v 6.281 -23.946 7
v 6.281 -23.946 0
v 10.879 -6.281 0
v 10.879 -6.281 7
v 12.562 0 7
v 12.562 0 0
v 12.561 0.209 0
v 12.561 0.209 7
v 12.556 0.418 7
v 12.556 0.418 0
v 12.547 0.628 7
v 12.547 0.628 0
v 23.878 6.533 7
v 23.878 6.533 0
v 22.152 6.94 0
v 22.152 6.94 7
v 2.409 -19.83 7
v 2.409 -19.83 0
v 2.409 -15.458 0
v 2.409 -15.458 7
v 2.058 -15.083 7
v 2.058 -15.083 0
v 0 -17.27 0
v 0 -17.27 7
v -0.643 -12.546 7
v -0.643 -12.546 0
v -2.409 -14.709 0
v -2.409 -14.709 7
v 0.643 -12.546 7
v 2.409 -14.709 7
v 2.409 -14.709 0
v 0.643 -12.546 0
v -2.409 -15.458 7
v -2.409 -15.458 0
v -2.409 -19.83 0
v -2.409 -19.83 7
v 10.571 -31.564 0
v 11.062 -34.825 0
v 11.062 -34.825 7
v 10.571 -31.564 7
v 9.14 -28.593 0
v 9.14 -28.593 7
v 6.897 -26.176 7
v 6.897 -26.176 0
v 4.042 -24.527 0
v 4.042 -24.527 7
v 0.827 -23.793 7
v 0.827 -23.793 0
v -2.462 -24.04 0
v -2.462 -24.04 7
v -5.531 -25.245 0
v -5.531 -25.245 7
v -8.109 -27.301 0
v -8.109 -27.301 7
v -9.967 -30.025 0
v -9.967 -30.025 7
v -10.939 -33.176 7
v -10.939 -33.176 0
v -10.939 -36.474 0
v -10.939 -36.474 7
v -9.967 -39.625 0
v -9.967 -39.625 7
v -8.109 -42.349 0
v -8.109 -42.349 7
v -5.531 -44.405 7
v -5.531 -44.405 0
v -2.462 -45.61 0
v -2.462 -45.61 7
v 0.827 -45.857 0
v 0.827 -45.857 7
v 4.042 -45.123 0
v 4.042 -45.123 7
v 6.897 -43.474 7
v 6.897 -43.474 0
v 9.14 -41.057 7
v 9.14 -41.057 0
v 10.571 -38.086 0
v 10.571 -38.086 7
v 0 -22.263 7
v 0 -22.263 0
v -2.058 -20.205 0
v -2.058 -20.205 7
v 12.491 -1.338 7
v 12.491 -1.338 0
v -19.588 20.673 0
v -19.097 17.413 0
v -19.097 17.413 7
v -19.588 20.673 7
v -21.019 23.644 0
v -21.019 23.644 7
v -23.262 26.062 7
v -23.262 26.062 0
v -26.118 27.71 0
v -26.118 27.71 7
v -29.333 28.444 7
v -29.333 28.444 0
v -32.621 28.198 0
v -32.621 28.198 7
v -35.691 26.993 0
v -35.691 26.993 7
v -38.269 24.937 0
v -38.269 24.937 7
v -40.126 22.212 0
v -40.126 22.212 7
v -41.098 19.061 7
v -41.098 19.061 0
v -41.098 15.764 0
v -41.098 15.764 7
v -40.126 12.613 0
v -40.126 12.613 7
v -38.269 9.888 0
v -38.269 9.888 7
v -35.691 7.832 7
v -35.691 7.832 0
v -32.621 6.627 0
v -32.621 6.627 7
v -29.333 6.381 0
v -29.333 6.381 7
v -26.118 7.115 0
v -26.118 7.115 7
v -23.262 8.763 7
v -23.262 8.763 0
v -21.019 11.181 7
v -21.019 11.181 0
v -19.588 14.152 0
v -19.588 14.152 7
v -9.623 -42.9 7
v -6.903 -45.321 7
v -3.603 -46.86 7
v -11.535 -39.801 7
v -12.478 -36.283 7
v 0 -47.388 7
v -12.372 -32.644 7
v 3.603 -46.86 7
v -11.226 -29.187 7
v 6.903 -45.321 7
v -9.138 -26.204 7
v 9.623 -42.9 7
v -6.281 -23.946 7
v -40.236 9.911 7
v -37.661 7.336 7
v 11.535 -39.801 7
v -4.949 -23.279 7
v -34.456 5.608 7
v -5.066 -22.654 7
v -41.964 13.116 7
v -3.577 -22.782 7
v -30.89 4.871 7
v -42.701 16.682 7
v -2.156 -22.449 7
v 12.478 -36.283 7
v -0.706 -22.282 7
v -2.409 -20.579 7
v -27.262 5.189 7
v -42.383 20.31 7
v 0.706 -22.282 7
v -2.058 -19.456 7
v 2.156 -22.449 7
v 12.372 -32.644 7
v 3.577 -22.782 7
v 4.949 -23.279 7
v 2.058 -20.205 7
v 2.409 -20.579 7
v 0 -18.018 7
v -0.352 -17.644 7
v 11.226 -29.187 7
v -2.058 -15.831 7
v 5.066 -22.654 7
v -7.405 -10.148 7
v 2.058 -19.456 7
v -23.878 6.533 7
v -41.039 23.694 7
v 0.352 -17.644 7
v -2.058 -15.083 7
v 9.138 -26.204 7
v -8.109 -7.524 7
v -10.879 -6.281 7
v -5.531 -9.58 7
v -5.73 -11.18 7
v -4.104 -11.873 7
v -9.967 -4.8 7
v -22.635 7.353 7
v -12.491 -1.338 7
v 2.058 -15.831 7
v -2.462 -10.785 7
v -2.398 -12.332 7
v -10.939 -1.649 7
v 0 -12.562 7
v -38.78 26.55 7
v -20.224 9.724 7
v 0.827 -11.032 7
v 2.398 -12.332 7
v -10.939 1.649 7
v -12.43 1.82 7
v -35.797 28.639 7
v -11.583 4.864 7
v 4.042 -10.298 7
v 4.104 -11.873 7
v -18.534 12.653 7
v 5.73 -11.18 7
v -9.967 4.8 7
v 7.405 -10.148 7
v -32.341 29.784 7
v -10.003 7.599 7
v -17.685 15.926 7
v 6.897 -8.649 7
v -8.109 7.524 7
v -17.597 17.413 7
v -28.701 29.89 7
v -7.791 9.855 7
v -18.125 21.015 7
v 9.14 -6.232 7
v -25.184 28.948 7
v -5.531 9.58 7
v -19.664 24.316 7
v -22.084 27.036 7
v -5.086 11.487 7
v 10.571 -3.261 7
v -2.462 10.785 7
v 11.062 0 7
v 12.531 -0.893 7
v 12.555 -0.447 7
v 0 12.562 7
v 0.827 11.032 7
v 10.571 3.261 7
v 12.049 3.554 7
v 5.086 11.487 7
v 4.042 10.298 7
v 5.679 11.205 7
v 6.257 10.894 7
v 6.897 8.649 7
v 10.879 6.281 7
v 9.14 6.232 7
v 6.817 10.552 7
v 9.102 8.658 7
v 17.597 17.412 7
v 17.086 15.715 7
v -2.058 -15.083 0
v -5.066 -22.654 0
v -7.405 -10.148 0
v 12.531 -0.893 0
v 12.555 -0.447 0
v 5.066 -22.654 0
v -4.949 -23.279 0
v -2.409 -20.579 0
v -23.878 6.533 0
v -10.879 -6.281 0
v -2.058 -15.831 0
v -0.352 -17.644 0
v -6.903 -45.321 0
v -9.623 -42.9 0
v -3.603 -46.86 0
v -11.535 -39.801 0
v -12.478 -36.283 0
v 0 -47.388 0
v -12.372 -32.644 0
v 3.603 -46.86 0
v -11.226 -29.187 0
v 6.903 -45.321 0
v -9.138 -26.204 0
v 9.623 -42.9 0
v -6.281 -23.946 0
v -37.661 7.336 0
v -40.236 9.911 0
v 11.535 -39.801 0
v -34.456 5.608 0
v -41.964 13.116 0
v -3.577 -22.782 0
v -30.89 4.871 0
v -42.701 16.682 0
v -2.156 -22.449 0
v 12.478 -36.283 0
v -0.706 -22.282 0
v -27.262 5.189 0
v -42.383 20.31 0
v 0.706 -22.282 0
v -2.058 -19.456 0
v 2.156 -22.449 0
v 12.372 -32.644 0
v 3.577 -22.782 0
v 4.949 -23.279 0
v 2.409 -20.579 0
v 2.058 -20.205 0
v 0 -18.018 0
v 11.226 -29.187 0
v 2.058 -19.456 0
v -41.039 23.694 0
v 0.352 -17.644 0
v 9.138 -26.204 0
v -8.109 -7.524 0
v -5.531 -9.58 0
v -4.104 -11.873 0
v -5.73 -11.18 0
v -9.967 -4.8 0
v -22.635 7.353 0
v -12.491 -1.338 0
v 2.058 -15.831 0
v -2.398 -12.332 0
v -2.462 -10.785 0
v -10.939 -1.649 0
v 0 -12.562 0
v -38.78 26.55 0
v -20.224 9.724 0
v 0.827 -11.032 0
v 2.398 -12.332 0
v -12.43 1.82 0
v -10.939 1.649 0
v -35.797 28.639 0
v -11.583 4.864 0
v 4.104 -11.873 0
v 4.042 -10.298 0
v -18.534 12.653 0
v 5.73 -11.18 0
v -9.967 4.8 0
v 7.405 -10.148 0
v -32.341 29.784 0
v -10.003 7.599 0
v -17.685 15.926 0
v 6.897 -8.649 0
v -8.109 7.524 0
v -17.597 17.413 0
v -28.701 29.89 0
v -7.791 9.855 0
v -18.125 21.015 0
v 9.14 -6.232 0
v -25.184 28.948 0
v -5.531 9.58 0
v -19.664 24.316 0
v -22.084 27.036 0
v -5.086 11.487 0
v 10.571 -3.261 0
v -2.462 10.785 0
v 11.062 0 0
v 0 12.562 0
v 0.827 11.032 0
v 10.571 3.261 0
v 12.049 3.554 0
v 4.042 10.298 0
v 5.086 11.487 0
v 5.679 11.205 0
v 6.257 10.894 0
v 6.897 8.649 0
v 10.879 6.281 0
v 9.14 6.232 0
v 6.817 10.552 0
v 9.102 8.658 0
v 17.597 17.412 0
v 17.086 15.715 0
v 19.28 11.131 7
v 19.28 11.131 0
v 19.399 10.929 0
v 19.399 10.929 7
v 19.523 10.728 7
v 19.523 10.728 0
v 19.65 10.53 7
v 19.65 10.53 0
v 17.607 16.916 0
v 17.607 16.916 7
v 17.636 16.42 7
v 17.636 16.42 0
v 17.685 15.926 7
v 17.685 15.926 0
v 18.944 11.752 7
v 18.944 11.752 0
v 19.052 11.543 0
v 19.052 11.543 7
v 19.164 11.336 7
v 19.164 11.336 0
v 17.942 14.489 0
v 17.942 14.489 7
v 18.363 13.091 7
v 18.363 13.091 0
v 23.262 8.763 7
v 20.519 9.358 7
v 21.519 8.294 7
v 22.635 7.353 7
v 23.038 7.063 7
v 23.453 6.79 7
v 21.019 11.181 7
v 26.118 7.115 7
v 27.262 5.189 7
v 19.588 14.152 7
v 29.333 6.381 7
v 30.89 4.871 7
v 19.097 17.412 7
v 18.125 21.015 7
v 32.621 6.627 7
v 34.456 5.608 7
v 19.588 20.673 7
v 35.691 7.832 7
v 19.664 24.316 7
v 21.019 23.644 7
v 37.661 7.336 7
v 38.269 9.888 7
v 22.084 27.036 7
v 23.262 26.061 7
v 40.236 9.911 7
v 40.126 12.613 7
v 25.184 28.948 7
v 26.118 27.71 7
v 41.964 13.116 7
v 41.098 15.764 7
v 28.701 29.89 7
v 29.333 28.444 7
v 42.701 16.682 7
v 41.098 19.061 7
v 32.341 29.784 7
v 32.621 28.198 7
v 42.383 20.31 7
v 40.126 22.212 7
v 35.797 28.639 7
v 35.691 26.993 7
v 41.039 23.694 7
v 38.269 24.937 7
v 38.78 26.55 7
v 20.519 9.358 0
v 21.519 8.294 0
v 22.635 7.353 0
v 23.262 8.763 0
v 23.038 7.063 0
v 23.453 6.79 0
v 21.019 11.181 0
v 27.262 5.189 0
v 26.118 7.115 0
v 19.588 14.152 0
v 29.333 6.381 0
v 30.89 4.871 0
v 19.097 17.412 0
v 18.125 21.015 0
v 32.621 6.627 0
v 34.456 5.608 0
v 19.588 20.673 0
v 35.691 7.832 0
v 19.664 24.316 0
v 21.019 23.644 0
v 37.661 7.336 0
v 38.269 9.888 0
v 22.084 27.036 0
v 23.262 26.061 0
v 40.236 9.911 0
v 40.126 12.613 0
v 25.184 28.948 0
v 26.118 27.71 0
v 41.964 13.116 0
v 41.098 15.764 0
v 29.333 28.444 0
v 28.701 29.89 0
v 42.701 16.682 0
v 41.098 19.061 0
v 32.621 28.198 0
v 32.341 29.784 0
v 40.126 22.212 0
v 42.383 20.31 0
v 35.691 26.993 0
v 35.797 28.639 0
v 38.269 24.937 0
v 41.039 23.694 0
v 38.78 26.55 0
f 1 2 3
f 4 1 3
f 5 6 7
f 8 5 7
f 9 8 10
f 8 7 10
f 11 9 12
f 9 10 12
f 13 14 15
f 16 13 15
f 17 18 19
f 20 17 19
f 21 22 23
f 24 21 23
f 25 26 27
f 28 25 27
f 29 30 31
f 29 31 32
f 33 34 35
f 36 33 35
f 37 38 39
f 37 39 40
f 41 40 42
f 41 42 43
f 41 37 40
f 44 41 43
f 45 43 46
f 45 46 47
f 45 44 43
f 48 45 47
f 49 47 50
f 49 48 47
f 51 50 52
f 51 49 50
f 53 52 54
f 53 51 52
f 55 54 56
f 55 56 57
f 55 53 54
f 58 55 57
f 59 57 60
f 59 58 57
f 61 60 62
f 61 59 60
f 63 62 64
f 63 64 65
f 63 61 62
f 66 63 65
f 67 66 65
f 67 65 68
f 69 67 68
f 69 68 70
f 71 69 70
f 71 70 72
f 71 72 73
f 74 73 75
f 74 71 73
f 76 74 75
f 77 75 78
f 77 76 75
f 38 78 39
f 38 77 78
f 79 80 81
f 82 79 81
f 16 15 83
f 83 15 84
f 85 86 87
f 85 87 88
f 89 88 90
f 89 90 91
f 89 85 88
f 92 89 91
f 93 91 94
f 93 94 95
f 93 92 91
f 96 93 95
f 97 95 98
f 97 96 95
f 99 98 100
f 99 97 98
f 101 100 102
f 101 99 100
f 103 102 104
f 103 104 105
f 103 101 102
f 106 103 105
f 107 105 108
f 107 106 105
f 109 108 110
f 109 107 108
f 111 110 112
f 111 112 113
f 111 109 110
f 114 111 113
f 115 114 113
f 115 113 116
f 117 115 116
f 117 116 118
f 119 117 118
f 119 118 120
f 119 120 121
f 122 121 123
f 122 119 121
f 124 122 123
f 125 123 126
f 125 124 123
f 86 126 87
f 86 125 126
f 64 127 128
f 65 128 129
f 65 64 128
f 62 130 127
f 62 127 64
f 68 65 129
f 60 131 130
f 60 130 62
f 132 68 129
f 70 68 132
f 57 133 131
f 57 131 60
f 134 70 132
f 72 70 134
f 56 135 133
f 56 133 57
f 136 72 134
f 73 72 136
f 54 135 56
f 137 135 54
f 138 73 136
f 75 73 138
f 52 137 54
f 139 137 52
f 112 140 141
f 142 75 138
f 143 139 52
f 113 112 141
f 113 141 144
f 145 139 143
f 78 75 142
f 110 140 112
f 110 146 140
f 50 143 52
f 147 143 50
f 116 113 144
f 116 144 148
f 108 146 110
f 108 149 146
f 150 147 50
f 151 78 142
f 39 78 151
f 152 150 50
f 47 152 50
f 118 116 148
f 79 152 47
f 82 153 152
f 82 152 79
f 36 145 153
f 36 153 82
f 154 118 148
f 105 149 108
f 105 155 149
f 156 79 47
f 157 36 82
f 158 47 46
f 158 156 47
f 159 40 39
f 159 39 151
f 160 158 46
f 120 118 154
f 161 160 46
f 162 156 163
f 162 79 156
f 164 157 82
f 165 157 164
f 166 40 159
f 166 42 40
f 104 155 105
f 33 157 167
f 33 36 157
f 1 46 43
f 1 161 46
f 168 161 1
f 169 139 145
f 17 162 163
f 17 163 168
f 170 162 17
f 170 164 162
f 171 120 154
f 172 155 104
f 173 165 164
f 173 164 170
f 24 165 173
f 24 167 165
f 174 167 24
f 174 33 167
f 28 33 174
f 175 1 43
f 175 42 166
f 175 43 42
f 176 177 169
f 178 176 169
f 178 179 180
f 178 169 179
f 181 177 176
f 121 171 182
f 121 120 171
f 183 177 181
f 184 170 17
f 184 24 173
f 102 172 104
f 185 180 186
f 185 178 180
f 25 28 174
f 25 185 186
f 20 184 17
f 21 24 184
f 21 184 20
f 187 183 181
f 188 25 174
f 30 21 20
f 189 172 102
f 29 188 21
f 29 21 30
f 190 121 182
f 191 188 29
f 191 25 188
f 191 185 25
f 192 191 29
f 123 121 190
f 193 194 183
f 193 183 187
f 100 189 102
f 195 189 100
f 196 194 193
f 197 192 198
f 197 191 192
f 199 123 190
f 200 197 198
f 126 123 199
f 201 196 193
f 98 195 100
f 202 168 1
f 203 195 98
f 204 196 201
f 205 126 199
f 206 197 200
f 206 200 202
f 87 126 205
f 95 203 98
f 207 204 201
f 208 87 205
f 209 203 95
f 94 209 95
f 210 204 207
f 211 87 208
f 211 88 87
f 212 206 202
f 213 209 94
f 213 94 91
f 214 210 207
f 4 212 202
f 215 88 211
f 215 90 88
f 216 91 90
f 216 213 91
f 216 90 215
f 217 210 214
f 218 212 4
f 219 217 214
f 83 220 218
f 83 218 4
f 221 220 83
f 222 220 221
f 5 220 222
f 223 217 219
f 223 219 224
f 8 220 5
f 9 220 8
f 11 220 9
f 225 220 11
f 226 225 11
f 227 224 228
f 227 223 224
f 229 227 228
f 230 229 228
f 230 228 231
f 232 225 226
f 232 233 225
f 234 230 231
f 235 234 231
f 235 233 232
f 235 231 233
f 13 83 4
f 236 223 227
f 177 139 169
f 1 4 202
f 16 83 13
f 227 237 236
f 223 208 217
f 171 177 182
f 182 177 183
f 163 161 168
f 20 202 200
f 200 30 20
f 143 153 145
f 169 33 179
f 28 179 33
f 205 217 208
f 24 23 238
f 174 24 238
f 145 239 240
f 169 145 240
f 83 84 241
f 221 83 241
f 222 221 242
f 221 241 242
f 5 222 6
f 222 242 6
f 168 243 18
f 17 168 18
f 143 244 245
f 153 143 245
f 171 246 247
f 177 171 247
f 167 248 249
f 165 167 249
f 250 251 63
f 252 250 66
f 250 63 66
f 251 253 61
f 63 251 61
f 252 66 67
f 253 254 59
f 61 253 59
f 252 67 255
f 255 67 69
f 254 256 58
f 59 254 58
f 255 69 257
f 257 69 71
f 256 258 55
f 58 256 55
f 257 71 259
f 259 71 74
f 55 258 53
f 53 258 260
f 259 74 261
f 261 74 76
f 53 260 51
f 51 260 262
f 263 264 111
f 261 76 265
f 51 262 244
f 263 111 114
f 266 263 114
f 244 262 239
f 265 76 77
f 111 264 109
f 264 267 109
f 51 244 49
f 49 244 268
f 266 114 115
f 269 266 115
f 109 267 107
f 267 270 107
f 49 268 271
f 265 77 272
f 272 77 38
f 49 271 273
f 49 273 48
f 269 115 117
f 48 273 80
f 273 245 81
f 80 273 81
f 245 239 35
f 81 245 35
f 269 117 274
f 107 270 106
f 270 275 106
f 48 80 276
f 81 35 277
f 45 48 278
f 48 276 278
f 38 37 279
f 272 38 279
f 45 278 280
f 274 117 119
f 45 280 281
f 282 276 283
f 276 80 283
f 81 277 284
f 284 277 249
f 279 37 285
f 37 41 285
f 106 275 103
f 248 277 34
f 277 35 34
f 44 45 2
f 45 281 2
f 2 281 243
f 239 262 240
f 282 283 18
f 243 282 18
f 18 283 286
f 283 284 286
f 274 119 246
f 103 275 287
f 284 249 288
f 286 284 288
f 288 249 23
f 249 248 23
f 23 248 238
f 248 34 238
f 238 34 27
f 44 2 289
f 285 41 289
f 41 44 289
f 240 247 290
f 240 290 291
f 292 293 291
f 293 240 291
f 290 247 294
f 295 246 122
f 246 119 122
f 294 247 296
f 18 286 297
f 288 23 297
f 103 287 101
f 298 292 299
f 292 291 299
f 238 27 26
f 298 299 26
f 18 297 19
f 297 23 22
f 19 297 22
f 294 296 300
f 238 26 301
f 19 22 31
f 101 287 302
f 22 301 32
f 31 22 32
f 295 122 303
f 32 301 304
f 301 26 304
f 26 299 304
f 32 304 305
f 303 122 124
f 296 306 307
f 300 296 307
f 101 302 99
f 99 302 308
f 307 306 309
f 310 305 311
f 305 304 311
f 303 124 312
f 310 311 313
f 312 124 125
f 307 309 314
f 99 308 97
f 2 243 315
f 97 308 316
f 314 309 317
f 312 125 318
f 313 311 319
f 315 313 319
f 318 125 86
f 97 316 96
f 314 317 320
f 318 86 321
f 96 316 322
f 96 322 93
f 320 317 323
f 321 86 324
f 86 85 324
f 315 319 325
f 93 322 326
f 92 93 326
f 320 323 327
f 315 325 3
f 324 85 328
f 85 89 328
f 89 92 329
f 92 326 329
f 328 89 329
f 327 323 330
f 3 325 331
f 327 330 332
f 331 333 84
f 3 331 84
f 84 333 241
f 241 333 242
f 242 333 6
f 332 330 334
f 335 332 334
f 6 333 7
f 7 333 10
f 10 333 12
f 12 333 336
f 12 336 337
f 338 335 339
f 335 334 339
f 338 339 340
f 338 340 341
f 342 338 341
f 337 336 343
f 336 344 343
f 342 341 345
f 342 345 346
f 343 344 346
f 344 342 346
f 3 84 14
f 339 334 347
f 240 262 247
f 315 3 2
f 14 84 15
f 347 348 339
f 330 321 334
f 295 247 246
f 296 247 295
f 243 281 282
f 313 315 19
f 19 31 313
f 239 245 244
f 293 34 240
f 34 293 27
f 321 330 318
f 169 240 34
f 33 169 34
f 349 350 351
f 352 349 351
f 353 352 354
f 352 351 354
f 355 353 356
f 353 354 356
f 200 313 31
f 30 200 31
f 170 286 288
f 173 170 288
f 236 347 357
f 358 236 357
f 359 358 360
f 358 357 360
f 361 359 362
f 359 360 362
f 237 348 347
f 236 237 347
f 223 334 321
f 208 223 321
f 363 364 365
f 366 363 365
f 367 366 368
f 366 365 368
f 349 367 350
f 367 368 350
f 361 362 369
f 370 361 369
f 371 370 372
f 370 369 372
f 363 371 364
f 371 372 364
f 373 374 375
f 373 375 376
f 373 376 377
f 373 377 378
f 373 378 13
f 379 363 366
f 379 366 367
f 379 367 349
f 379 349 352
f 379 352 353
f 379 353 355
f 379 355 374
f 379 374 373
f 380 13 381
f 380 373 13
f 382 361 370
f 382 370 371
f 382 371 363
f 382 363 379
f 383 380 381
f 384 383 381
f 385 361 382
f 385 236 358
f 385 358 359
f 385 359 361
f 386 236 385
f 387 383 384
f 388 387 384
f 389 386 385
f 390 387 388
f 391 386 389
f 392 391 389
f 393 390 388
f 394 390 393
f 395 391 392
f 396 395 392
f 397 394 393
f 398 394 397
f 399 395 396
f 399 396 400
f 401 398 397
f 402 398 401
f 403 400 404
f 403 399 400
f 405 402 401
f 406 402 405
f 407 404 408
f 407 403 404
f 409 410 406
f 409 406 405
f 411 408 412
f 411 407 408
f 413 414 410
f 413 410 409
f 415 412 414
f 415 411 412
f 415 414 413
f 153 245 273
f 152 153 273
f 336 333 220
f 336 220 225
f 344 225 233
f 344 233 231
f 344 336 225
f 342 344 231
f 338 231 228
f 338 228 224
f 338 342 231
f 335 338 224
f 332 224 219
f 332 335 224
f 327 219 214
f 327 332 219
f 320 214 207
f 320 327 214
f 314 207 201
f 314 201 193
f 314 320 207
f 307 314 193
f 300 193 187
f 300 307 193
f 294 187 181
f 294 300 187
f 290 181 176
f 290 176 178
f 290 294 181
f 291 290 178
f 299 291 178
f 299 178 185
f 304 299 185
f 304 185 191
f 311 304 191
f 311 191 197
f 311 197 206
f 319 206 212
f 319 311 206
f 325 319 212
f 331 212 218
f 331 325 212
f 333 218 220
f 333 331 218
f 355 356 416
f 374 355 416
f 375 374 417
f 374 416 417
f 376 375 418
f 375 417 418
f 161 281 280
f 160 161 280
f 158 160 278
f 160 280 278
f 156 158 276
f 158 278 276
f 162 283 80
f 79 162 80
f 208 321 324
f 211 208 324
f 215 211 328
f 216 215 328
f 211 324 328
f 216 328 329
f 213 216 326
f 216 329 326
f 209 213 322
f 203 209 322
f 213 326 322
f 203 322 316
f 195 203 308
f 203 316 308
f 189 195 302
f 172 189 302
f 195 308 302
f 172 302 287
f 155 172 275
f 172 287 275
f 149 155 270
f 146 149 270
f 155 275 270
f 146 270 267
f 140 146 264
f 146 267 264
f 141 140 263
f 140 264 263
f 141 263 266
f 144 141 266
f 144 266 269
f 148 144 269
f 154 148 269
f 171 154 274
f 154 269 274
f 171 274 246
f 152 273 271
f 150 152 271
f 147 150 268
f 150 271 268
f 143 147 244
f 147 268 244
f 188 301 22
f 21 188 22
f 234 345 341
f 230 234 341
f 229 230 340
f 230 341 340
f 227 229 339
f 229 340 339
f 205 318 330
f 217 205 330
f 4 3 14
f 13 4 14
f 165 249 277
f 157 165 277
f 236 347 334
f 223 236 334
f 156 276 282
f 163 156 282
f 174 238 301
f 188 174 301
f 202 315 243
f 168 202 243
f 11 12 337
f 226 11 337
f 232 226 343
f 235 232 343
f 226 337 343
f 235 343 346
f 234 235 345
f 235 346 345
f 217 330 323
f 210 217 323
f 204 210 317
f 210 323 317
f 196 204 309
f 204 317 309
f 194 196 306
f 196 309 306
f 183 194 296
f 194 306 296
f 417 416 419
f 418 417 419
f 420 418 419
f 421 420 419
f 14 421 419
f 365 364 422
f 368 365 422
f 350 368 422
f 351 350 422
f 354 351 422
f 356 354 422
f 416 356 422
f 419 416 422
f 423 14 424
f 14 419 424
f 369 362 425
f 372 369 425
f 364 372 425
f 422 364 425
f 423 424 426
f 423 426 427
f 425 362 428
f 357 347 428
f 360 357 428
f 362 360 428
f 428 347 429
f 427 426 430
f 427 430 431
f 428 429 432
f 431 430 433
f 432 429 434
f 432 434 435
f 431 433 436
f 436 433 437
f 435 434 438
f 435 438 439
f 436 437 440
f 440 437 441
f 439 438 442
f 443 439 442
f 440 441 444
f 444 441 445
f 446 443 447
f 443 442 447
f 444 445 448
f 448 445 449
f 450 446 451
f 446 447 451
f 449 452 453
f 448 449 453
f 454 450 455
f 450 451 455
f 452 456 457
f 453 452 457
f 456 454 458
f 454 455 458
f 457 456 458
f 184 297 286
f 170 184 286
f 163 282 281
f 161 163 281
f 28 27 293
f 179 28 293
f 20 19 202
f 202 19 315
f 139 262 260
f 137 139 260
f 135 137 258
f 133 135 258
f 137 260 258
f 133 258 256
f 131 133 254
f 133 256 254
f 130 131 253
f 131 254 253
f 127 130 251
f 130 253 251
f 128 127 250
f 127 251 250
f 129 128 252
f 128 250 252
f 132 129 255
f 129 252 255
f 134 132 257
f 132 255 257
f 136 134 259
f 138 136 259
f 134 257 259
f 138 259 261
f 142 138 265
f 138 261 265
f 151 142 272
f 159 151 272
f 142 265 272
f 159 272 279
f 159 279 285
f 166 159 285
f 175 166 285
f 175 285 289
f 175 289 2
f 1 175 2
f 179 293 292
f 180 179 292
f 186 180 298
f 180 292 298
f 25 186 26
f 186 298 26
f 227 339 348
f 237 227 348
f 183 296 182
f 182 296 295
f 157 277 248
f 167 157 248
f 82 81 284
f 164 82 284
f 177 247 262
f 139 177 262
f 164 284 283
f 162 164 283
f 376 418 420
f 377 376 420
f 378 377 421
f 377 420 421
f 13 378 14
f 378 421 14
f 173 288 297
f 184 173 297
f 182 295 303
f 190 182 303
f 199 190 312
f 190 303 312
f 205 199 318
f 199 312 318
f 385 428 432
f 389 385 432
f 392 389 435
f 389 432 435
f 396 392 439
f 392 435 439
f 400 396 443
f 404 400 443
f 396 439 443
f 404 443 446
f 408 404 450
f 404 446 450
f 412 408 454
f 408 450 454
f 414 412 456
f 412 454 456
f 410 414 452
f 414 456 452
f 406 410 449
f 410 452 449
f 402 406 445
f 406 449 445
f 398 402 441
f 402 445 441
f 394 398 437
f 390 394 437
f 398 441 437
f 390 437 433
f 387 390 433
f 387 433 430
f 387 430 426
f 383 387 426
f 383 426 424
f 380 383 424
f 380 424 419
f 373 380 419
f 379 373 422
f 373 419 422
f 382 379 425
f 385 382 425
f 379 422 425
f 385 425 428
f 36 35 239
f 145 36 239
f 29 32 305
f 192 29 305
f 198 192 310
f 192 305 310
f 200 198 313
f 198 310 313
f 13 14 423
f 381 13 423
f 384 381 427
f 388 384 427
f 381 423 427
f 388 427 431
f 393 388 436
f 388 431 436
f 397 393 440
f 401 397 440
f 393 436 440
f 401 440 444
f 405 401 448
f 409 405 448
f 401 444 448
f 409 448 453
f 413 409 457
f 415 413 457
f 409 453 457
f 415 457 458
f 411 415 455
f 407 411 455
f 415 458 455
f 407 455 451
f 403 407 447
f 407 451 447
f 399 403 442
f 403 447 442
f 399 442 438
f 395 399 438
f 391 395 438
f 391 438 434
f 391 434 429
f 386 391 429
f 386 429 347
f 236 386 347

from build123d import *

# Parameters (mm, degrees)
F0_R     = 11.0625
F1_DEPTH = 7
F2_DEPTH = 7
F3_DEPTH = 7


# Not quite as in the source:
# - ends of sketch curves that miss each other by under 0.0002 mm in the source are joined


with BuildPart() as f1:
    # F0 (on Top) → F1 (new body)
    with BuildSketch(Plane.XY):
        with BuildLine():
            ThreePointArc((-22.6345681923, 7.3529683934), (-23.2441620991, 6.9245708082), (-23.878080543, 6.5330652161))
            Line((-23.878080543, 6.5330652161), (-10.879445222, -6.2812481173))
            ThreePointArc((-10.879445222, -6.2812481173), (-11.9437306049, -3.894060283), (-12.4910099647, -1.3383109926))
            Line((-12.4910099647, -1.3383109926), (-22.6345681923, 7.3529683934))
        make_face()
        with BuildLine():
            ThreePointArc((-17.6851304944, 15.925639103), (-17.6189235491, 16.6677649143), (-17.5968286604, 17.4125104381))
            ThreePointArc((-17.5968286604, 17.4125104381), (-41.0387722519, 23.6937613794), (-23.878080543, 6.5330652161))
            ThreePointArc((-23.878080543, 6.5330652161), (-23.2441620991, 6.9245708082), (-22.6345681923, 7.3529683934))
            ThreePointArc((-22.6345681923, 7.3529683934), (-19.2798866993, 11.1312566727), (-17.6851304944, 15.925639103))
        make_face()
        with Locations((-30.1593286604, 17.4125104381)):
            Circle(F0_R, mode=Mode.SUBTRACT)
        with BuildLine():
            Line((6.5218e-06, 12.5625), (-17.5968286604, 17.4125039163))
            ThreePointArc((-17.5968286604, 17.4125039163), (-17.6189235491, 16.6677649143), (-17.6851304944, 15.925639103))
            Line((-17.6851304944, 15.925639103), (-5.0864857136, 11.4866909655))
            ThreePointArc((-5.0864857136, 11.4866909655), (-2.5995016661, 12.2906060607), (6.5218e-06, 12.5625))
        make_face()
        with BuildLine():
            ThreePointArc((5.0864976401, 11.4866856842), (2.5995144273, 12.2906033616), (6.5218e-06, 12.5625))
            ThreePointArc((6.5218e-06, 12.5625), (-2.5995016661, 12.2906060607), (-5.0864857136, 11.4866909655))
            ThreePointArc((-5.0864857136, 11.4866909655), (-10.8794419611, 6.2812537653), (-12.4910099647, -1.3383109926))
            ThreePointArc((-12.4910099647, -1.3383109926), (-11.9437306049, -3.894060283), (-10.879445222, -6.2812481173))
            ThreePointArc((-10.879445222, -6.2812481173), (-9.3442233374, -8.3965407443), (-7.4045198124, -10.1483738893))
            ThreePointArc((-7.4045198124, -10.1483738893), (-6.5874472871, -10.6968193632), (-5.729952579, -11.1796265453))
            ThreePointArc((-5.729952579, -11.1796265453), (-3.2590434265, -12.1323963912), (-0.6433064868, -12.546017815))
            ThreePointArc((-0.6433064868, -12.546017815), (-0.3217587988, -12.5583787777), (0, -12.5625))
            ThreePointArc((0, -12.5625), (0.3217590306, -12.5583787718), (0.64330695, -12.5460177912))
            ThreePointArc((0.64330695, -12.5460177912), (3.2590426993, -12.1323965866), (5.7299508261, -11.1796274437))
            ThreePointArc((5.7299508261, -11.1796274437), (6.5874457148, -10.6968203315), (7.4045184202, -10.1483749051))
            ThreePointArc((7.4045184202, -10.1483749051), (9.3442190031, -8.3965455678), (10.879439599, -6.2812578567))
            ThreePointArc((10.879439599, -6.2812578567), (11.9437270351, -3.894071232), (12.491008709, -1.3383227122))
            ThreePointArc((12.491008709, -1.3383227122), (12.5446144452, -0.6701154167), (12.5625, 0))
            ThreePointArc((12.5625, 0), (12.5585786957, 0.3138588742), (12.546817231, 0.6275218102))
            ThreePointArc((12.546817231, 0.6275218102), (10.8794485026, 6.2812424352), (6.816873119, 10.5520920736))
            ThreePointArc((6.816873119, 10.5520920736), (5.9700021073, 11.0533018184), (5.0864976401, 11.4866856842))
        make_face()
        Circle(F0_R, mode=Mode.SUBTRACT)
        with BuildLine():
            Line((17.5968467396, 17.4124856456), (6.5218e-06, 12.5625))
            ThreePointArc((6.5218e-06, 12.5625), (2.5995144273, 12.2906033616), (5.0864976401, 11.4866856842))
            Line((5.0864976401, 11.4866856842), (17.0859847543, 15.7145153795))
            Line((17.0859847543, 15.7145153795), (17.5968467396, 17.4124856456))
        make_face()
        with BuildLine():
            Line((10.879439599, -6.2812578567), (23.8780929743, 6.5330371628))
            Line((23.8780929743, 6.5330371628), (22.1521745654, 6.9396060316))
            Line((22.1521745654, 6.9396060316), (12.491008709, -1.3383227122))
            ThreePointArc((12.491008709, -1.3383227122), (11.9437270351, -3.894071232), (10.879439599, -6.2812578567))
        make_face()
        with BuildLine():
            ThreePointArc((-4.9494347308, -23.2785935419), (-5.6252349846, -23.5923183247), (-6.2812481173, -23.945554778))
            ThreePointArc((-6.2812481173, -23.945554778), (-6.2812509413, -45.7044435916), (12.5625, -34.825))
            ThreePointArc((12.5625, -34.825), (10.879445222, -28.5437518827), (6.2812537653, -23.9455580389))
            ThreePointArc((6.2812537653, -23.9455580389), (5.6252404686, -23.5923210711), (4.949440011, -23.2785958053))
            ThreePointArc((4.949440011, -23.2785958053), (2.8710438959, -22.5949749306), (0.7055599905, -22.282329178))
            ThreePointArc((0.7055599905, -22.282329178), (0.3529192884, -22.267458273), (0, -22.2625))
            ThreePointArc((0, -22.2625), (-0.3529192884, -22.267458273), (-0.7055599905, -22.282329178))
            ThreePointArc((-0.7055599905, -22.282329178), (-2.8710410995, -22.5949742742), (-4.9494347308, -23.2785935419))
        make_face()
        with Locations((0, -34.825)):
            Circle(F0_R, mode=Mode.SUBTRACT)
        with BuildLine():
            Line((6.2812537653, -23.9455580389), (10.879439599, -6.2812578567))
            ThreePointArc((10.879439599, -6.2812578567), (9.3442190031, -8.3965455678), (7.4045184202, -10.1483749051))
            Line((7.4045184202, -10.1483749051), (5.0661976857, -22.6541538095))
            Line((5.0661976857, -22.6541538095), (6.2812537653, -23.9455580389))
        make_face()
        with BuildLine():
            ThreePointArc((-7.4045198124, -10.1483738893), (-9.3442233374, -8.3965407443), (-10.879445222, -6.2812481173))
            Line((-10.879445222, -6.2812481173), (-6.2812481173, -23.945554778))
            Line((-6.2812481173, -23.945554778), (-5.0661928327, -22.6541510186))
            Line((-5.0661928327, -22.6541510186), (-7.4045198124, -10.1483738893))
        make_face()
        with BuildLine():
            ThreePointArc((4.949440011, -23.2785958053), (5.6252404686, -23.5923210711), (6.2812537653, -23.9455580389))
            Line((6.2812537653, -23.9455580389), (5.0661976857, -22.6541538095))
            Line((5.0661976857, -22.6541538095), (4.949440011, -23.2785958053))
        make_face()
        with BuildLine():
            Line((-5.0661928327, -22.6541510186), (-6.2812481173, -23.945554778))
            ThreePointArc((-6.2812481173, -23.945554778), (-5.6252349846, -23.5923183247), (-4.9494347308, -23.2785935419))
            Line((-4.9494347308, -23.2785935419), (-5.0661928327, -22.6541510186))
        make_face()
    extrude(amount=F1_DEPTH)

    # F0 (on Top) → F2 (join)
    with BuildSketch(Plane.XY):
        with BuildLine():
            Line((2.0575288422, -20.2049711578), (0, -22.2625))
            ThreePointArc((0, -22.2625), (0.3529192884, -22.267458273), (0.7055599905, -22.282329178))
            Line((0.7055599905, -22.282329178), (2.4091755513, -20.5787136171))
            Line((2.4091755513, -20.5787136171), (2.0575288422, -20.2049711578))
        make_face()
        with BuildLine():
            Line((-2.4091743081, -20.5787148604), (-0.7055599905, -22.282329178))
            ThreePointArc((-0.7055599905, -22.282329178), (-0.3529192884, -22.267458273), (0, -22.2625))
            Line((0, -22.2625), (-2.0575276516, -20.2049723484))
            Line((-2.0575276516, -20.2049723484), (-2.4091743081, -20.5787148604))
        make_face()
        Polygon((-2.0575276516, -19.4564351822), (-2.4091743081, -19.8301776941), (-2.4091743081, -20.5787148604), (-2.0575276516, -20.2049723484), align=None)
        Polygon((2.0575288422, -19.456435009), (2.0575288422, -20.2049711578), (2.4091755513, -20.5787136171), (2.4091755513, -19.8301774684), align=None)
        Polygon((2.0575288422, -15.8313446679), (2.4091755513, -15.4576021), (2.4091755513, -14.7090649338), (2.0575288422, -15.0828075016), align=None)
        Polygon((-2.4091743081, -14.709066195), (-2.4091743081, -15.4576023437), (-2.0575276516, -15.8313447471), (-2.0575276516, -15.0828085984), align=None)
        Polygon((-2.0575276516, -15.8313447471), (-2.4091743081, -15.4576023437), (-2.4091743081, -19.8301776941), (-2.0575276516, -19.4564351822), align=None)
        Polygon((2.4091755513, -19.8301774684), (2.4091755513, -15.4576021), (2.0575288422, -15.8313446679), (2.0575288422, -19.456435009), align=None)
        with BuildLine():
            ThreePointArc((0, -12.5625), (-0.3217587988, -12.5583787777), (-0.6433064868, -12.546017815))
            Line((-0.6433064868, -12.546017815), (-2.4091743081, -14.709066195))
            Line((-2.4091743081, -14.709066195), (-2.0575276516, -15.0828085984))
            Line((-2.0575276516, -15.0828085984), (0, -12.5625))
        make_face()
        with BuildLine():
            ThreePointArc((0.64330695, -12.5460177912), (0.3217590306, -12.5583787718), (0, -12.5625))
            Line((0, -12.5625), (2.0575288422, -15.0828075016))
            Line((2.0575288422, -15.0828075016), (2.4091755513, -14.7090649338))
            Line((2.4091755513, -14.7090649338), (0.64330695, -12.5460177912))
        make_face()
        Polygon((2.4091755513, -20.5787136171), (4.949440011, -23.2785958053), (5.0661976857, -22.6541538095), (2.4091755513, -19.8301774684), align=None)
        Polygon((-2.4091743081, -19.8301776941), (-5.0661928327, -22.6541510186), (-4.9494347308, -23.2785935419), (-2.4091743081, -20.5787148604), align=None)
        with BuildLine():
            Line((2.4091755513, -15.4576021), (7.4045184202, -10.1483749051))
            ThreePointArc((7.4045184202, -10.1483749051), (6.5874457148, -10.6968203315), (5.7299508261, -11.1796274437))
            Line((5.7299508261, -11.1796274437), (2.4091755513, -14.7090649338))
            Line((2.4091755513, -14.7090649338), (2.4091755513, -15.4576021))
        make_face()
        with BuildLine():
            ThreePointArc((-5.729952579, -11.1796265453), (-6.5874472871, -10.6968193632), (-7.4045198124, -10.1483738893))
            Line((-7.4045198124, -10.1483738893), (-2.4091743081, -15.4576023437))
            Line((-2.4091743081, -15.4576023437), (-2.4091743081, -14.709066195))
            Line((-2.4091743081, -14.709066195), (-5.729952579, -11.1796265453))
        make_face()
        Polygon((0.3521420553, -17.6438901016), (8.567e-07, -18.0181582303), (2.0575288422, -20.2049711578), (2.0575288422, -19.456435009), align=None)
        Polygon((3.781e-07, -17.2696215728), (-0.3521408205, -17.6438897015), (8.567e-07, -18.0181582303), (0.3521420553, -17.6438901016), align=None)
        Polygon((2.0575288422, -15.8313446679), (2.0575288422, -15.0828075016), (3.781e-07, -17.2696215728), (0.3521420553, -17.6438901016), align=None)
    extrude(amount=F2_DEPTH)

    # F0 (on Top) → F3 (join)
    with BuildSketch(Plane.XY):
        Polygon((-0.3521408205, -17.6438897015), (-2.0575276516, -19.4564351822), (-2.0575276516, -20.2049723484), (8.567e-07, -18.0181582303), align=None)
        Polygon((-2.0575276516, -15.0828085984), (-2.0575276516, -15.8313447471), (-0.3521408205, -17.6438897015), (3.781e-07, -17.2696215728), align=None)
    extrude(amount=F3_DEPTH)


with BuildPart() as f1b:
    # F0 (on Top) → F1, piece 2 (new body)
    with BuildSketch(Plane.XY):
        with BuildLine():
            ThreePointArc((42.7218467396, 17.4124791239), (30.1593500005, 29.9749791239), (17.5968467396, 17.4124856456))
            ThreePointArc((17.5968467396, 17.4124856456), (17.6189410484, 16.6677433655), (17.6851470299, 15.9256207407))
            ThreePointArc((17.6851470299, 15.9256207407), (18.1323107106, 13.7838691135), (18.9442912632, 11.7521843515))
            ThreePointArc((18.9442912632, 11.7521843515), (19.1077328162, 11.4393529795), (19.2798982567, 11.1312366546))
            ThreePointArc((19.2798982567, 11.1312366546), (19.4606516814, 10.8280785967), (19.6498504077, 10.5301181118))
            ThreePointArc((19.6498504077, 10.5301181118), (21.0033498024, 8.8110765443), (22.6345791818, 7.3529423825))
            ThreePointArc((22.6345791818, 7.3529423825), (23.2441737601, 6.9245437258), (23.8780929743, 6.5330371628))
            ThreePointArc((23.8780929743, 6.5330371628), (36.4405948569, 6.5330339019), (42.7218467396, 17.4124791239))
        make_face()
        with BuildLine():
            ThreePointArc((41.2218467396, 17.4124791239), (30.1593438681, 6.3499791239), (19.0968467396, 17.4124848669))
            ThreePointArc((19.0968467396, 17.4124848669), (30.1593496111, 28.4749791239), (41.2218467396, 17.4124791239))
        make_face(mode=Mode.SUBTRACT)
    extrude(amount=F1_DEPTH)


solid = Compound([f1.part, f1b.part])
